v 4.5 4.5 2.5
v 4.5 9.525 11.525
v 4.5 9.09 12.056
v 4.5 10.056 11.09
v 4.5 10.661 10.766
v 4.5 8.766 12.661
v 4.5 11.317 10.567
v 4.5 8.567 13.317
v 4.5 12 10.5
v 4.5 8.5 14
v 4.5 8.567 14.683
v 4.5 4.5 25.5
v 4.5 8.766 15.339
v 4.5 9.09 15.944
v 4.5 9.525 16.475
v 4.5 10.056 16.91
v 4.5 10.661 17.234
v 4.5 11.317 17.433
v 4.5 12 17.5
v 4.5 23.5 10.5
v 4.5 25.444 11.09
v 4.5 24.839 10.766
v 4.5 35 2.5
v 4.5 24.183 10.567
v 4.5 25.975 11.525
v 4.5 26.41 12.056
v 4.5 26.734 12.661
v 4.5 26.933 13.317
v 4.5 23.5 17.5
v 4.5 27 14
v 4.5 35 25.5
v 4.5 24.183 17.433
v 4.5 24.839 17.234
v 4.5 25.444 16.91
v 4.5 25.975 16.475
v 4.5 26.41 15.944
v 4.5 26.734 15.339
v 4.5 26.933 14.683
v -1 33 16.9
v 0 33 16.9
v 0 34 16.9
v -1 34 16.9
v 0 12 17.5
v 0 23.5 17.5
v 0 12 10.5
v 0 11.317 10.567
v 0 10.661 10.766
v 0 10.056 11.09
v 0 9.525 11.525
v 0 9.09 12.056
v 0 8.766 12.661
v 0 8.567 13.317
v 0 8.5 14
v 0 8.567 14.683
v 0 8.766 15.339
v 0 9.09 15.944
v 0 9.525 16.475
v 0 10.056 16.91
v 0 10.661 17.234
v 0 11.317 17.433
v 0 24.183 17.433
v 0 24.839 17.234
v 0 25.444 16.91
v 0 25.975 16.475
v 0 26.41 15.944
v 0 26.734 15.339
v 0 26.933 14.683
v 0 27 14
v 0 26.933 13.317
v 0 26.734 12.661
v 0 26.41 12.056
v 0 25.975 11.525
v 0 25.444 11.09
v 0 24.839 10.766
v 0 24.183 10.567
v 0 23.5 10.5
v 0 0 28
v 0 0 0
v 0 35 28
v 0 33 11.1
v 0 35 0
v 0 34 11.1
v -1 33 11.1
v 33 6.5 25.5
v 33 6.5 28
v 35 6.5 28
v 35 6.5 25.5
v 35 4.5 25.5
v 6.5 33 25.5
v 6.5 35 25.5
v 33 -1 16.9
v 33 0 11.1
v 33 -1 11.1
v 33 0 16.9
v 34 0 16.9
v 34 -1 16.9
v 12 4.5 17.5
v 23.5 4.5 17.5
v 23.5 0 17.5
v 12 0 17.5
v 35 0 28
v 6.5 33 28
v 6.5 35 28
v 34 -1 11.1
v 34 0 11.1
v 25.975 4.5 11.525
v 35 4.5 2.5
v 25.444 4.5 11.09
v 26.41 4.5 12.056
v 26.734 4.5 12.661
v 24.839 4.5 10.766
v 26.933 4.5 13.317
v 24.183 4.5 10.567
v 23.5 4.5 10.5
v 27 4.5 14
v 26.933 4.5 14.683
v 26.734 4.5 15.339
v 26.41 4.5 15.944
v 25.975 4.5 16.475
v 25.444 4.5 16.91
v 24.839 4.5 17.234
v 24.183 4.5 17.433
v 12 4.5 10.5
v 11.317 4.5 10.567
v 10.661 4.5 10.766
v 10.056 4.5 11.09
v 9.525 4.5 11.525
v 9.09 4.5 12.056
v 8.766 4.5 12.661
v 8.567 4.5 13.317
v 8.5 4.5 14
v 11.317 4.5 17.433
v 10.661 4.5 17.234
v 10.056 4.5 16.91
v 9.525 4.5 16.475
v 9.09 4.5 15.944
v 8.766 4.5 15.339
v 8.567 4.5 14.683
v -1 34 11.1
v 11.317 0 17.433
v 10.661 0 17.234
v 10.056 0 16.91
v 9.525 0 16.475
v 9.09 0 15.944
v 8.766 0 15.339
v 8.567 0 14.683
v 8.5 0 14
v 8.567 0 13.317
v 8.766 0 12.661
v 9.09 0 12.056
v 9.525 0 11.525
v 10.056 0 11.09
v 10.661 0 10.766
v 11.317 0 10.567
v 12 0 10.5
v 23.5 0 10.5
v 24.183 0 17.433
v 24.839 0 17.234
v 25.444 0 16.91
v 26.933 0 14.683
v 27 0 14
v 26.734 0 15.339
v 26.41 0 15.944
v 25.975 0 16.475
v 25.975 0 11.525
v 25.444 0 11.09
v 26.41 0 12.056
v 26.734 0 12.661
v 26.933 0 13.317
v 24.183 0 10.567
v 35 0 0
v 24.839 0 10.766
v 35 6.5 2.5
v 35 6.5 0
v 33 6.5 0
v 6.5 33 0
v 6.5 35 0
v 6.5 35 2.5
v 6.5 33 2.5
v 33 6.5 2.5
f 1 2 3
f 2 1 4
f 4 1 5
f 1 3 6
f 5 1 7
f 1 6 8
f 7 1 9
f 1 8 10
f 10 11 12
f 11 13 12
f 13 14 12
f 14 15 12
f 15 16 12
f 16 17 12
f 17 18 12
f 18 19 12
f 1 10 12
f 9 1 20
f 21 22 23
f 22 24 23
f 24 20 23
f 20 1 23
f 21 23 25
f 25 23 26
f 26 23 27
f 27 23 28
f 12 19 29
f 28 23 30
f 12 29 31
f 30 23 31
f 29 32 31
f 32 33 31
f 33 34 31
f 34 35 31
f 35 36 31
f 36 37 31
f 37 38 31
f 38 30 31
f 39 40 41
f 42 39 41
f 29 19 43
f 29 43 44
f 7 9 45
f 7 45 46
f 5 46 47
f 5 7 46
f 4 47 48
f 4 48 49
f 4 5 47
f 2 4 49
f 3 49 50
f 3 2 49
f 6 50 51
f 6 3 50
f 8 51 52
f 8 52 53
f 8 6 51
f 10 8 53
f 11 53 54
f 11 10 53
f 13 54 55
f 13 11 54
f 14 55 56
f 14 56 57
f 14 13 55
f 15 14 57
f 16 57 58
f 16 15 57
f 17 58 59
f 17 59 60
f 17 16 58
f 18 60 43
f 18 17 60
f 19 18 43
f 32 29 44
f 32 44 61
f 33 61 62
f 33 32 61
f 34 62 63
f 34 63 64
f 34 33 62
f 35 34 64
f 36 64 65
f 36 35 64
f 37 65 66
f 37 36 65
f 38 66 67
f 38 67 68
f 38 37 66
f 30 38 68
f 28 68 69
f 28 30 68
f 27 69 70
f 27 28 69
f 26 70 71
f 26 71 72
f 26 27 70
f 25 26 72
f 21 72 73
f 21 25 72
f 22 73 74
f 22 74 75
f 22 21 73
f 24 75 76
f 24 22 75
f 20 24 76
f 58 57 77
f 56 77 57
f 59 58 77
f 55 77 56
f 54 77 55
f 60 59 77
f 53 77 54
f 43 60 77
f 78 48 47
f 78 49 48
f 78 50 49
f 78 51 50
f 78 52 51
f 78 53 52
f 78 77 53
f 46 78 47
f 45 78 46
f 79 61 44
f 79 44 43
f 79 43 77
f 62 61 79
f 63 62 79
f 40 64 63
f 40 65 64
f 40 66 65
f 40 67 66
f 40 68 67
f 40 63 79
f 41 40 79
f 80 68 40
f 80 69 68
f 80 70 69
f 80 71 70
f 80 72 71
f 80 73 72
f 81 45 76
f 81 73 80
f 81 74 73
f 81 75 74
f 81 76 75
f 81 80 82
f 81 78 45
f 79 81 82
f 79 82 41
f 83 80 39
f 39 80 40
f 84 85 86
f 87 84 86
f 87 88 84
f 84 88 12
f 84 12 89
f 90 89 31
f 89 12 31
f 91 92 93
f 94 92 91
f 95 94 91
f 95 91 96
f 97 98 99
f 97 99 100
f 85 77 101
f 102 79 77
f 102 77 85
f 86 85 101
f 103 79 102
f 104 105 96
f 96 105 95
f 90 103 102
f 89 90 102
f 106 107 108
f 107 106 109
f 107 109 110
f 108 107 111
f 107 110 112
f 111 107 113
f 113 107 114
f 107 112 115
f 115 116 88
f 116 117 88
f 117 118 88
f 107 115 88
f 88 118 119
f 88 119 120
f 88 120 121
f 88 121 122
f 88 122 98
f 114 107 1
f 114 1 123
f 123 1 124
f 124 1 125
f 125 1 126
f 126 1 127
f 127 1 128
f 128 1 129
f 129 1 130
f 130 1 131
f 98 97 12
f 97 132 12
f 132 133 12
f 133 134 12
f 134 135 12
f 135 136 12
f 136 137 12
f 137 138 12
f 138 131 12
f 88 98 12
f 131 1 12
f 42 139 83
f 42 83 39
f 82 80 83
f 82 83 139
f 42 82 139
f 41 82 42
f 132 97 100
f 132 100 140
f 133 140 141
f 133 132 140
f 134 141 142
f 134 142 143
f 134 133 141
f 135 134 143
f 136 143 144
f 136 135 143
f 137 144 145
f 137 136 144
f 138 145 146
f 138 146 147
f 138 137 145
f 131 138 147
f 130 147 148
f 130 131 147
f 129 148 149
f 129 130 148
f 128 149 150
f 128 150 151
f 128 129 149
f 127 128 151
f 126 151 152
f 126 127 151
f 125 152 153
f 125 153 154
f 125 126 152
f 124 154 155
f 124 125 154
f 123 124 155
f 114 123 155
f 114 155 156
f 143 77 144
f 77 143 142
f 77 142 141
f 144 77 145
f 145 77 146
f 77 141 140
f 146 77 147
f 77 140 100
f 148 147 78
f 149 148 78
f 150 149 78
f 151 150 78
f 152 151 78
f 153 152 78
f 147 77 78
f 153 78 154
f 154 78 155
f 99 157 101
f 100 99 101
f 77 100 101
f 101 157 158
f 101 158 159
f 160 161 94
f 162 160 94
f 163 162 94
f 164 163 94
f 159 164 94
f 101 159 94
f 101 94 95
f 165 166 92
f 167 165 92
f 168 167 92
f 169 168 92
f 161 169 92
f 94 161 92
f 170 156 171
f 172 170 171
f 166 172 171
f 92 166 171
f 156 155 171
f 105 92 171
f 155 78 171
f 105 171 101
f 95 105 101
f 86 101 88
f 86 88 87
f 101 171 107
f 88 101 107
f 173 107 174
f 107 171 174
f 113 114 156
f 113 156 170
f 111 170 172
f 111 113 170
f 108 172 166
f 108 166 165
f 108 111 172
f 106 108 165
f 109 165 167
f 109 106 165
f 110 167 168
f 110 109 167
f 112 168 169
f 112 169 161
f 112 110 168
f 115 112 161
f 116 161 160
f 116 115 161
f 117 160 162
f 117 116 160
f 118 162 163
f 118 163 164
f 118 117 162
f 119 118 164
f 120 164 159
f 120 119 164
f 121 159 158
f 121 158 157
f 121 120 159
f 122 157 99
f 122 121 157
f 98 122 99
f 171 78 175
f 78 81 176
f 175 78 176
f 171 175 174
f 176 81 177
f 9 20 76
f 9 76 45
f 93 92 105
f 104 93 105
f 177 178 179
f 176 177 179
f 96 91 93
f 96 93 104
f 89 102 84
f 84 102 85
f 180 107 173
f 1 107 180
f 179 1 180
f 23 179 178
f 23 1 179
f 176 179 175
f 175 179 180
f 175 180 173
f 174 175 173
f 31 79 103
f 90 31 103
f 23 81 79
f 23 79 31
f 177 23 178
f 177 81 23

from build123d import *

# Parameters (mm, degrees)
SKETCH1_W           = 35
SKETCH1_H           = 35
BOSS_EXTRUDE1_DEPTH = 28
CUT_EXTRUDE1_DEPTH  = 57.868268832
CUT_EXTRUDE2_REACH  = 56.215
SKETCH3_W           = 23
SKETCH3_H           = 33.717030155
CUT_EXTRUDE3_DEPTH  = 4.5
CUT_EXTRUDE4_DEPTH  = 4.5
SKETCH6_W           = 1
SKETCH6_H           = 5.8
BOSS_EXTRUDE2_DEPTH = 1
SKETCH7_W           = 5.8
SKETCH7_H           = 1
BOSS_EXTRUDE3_DEPTH = 1


with BuildPart() as part:
    # Sketch1 → Boss-Extrude1 (new body)
    with BuildSketch(Plane.XY):
        with Locations((17.5, 17.5)):
            Rectangle(SKETCH1_W, SKETCH1_H)
    extrude(amount=BOSS_EXTRUDE1_DEPTH)

    # Sketch2 → Cut-Extrude1 (cut, through all)
    with BuildSketch(Plane.XY.offset(28)):
        Polygon((6.5, 37.082021278), (6.5, 33), (33, 6.5), (39.701272532, 6.5), (39.701272532, 37.082021278), align=None)
    extrude(amount=-CUT_EXTRUDE1_DEPTH, mode=Mode.SUBTRACT)

    # Cut-Extrude2: up to this face of the body (flat: up to its plane)
    cut_extrude2_end = Plane(part.part.faces().sort_by_distance((35, 3.25, 14))[0])
    # Sketch3 → Cut-Extrude2 (cut, up to the picked face)
    with BuildSketch(Plane.ZY.offset(-4.5), mode=Mode.PRIVATE) as cut_extrude2_sk1:
        with Locations((14, 21.358515078)):
            Rectangle(SKETCH3_W, SKETCH3_H)
    cut_extrude2_tool1 = split(extrude(cut_extrude2_sk1.sketch, amount=-CUT_EXTRUDE2_REACH, mode=Mode.PRIVATE), bisect_by=cut_extrude2_end, keep=Keep.BOTH, mode=Mode.PRIVATE)
    add(cut_extrude2_tool1.solids().sort_by(Axis((4.5, 21.358515, 14), (1, 0, 0)))[0], mode=Mode.SUBTRACT)

    # Sketch4 → Cut-Extrude3 (cut)
    with BuildSketch(Plane(origin=(4.5, 0, 0), x_dir=(0, 0, -1), z_dir=(1, 0, 0))):
        with BuildLine():
            Line((-10.5, 23.5), (-10.5, 12))
            ThreePointArc((-10.5, 12), (-14, 8.5), (-17.5, 12))
            Line((-17.5, 12), (-17.5, 23.5))
            ThreePointArc((-17.5, 23.5), (-14, 27), (-10.5, 23.5))
        make_face()
    extrude(amount=-CUT_EXTRUDE3_DEPTH, mode=Mode.SUBTRACT)

    # Sketch5 → Cut-Extrude4 (cut)
    with BuildSketch(Plane(origin=(0, 4.5, 0), x_dir=(1, 0, 0), z_dir=(0, 1, 0))):
        with BuildLine():
            Line((23.5, -17.5), (12, -17.5))
            ThreePointArc((12, -17.5), (8.5, -14), (12, -10.5))
            Line((12, -10.5), (23.5, -10.5))
            ThreePointArc((23.5, -10.5), (27, -14), (23.5, -17.5))
        make_face()
    extrude(amount=-CUT_EXTRUDE4_DEPTH, mode=Mode.SUBTRACT)

    # Sketch6 → Boss-Extrude2 (add)
    with BuildSketch(Plane.XZ):
        with Locations((33.5, 14)):
            Rectangle(SKETCH6_W, SKETCH6_H)
    extrude(amount=BOSS_EXTRUDE2_DEPTH)

    # Sketch7 → Boss-Extrude3 (add)
    with BuildSketch(Plane.ZY):
        with Locations((14, 33.5)):
            Rectangle(SKETCH7_W, SKETCH7_H)
    extrude(amount=BOSS_EXTRUDE3_DEPTH)


solid = part.part
